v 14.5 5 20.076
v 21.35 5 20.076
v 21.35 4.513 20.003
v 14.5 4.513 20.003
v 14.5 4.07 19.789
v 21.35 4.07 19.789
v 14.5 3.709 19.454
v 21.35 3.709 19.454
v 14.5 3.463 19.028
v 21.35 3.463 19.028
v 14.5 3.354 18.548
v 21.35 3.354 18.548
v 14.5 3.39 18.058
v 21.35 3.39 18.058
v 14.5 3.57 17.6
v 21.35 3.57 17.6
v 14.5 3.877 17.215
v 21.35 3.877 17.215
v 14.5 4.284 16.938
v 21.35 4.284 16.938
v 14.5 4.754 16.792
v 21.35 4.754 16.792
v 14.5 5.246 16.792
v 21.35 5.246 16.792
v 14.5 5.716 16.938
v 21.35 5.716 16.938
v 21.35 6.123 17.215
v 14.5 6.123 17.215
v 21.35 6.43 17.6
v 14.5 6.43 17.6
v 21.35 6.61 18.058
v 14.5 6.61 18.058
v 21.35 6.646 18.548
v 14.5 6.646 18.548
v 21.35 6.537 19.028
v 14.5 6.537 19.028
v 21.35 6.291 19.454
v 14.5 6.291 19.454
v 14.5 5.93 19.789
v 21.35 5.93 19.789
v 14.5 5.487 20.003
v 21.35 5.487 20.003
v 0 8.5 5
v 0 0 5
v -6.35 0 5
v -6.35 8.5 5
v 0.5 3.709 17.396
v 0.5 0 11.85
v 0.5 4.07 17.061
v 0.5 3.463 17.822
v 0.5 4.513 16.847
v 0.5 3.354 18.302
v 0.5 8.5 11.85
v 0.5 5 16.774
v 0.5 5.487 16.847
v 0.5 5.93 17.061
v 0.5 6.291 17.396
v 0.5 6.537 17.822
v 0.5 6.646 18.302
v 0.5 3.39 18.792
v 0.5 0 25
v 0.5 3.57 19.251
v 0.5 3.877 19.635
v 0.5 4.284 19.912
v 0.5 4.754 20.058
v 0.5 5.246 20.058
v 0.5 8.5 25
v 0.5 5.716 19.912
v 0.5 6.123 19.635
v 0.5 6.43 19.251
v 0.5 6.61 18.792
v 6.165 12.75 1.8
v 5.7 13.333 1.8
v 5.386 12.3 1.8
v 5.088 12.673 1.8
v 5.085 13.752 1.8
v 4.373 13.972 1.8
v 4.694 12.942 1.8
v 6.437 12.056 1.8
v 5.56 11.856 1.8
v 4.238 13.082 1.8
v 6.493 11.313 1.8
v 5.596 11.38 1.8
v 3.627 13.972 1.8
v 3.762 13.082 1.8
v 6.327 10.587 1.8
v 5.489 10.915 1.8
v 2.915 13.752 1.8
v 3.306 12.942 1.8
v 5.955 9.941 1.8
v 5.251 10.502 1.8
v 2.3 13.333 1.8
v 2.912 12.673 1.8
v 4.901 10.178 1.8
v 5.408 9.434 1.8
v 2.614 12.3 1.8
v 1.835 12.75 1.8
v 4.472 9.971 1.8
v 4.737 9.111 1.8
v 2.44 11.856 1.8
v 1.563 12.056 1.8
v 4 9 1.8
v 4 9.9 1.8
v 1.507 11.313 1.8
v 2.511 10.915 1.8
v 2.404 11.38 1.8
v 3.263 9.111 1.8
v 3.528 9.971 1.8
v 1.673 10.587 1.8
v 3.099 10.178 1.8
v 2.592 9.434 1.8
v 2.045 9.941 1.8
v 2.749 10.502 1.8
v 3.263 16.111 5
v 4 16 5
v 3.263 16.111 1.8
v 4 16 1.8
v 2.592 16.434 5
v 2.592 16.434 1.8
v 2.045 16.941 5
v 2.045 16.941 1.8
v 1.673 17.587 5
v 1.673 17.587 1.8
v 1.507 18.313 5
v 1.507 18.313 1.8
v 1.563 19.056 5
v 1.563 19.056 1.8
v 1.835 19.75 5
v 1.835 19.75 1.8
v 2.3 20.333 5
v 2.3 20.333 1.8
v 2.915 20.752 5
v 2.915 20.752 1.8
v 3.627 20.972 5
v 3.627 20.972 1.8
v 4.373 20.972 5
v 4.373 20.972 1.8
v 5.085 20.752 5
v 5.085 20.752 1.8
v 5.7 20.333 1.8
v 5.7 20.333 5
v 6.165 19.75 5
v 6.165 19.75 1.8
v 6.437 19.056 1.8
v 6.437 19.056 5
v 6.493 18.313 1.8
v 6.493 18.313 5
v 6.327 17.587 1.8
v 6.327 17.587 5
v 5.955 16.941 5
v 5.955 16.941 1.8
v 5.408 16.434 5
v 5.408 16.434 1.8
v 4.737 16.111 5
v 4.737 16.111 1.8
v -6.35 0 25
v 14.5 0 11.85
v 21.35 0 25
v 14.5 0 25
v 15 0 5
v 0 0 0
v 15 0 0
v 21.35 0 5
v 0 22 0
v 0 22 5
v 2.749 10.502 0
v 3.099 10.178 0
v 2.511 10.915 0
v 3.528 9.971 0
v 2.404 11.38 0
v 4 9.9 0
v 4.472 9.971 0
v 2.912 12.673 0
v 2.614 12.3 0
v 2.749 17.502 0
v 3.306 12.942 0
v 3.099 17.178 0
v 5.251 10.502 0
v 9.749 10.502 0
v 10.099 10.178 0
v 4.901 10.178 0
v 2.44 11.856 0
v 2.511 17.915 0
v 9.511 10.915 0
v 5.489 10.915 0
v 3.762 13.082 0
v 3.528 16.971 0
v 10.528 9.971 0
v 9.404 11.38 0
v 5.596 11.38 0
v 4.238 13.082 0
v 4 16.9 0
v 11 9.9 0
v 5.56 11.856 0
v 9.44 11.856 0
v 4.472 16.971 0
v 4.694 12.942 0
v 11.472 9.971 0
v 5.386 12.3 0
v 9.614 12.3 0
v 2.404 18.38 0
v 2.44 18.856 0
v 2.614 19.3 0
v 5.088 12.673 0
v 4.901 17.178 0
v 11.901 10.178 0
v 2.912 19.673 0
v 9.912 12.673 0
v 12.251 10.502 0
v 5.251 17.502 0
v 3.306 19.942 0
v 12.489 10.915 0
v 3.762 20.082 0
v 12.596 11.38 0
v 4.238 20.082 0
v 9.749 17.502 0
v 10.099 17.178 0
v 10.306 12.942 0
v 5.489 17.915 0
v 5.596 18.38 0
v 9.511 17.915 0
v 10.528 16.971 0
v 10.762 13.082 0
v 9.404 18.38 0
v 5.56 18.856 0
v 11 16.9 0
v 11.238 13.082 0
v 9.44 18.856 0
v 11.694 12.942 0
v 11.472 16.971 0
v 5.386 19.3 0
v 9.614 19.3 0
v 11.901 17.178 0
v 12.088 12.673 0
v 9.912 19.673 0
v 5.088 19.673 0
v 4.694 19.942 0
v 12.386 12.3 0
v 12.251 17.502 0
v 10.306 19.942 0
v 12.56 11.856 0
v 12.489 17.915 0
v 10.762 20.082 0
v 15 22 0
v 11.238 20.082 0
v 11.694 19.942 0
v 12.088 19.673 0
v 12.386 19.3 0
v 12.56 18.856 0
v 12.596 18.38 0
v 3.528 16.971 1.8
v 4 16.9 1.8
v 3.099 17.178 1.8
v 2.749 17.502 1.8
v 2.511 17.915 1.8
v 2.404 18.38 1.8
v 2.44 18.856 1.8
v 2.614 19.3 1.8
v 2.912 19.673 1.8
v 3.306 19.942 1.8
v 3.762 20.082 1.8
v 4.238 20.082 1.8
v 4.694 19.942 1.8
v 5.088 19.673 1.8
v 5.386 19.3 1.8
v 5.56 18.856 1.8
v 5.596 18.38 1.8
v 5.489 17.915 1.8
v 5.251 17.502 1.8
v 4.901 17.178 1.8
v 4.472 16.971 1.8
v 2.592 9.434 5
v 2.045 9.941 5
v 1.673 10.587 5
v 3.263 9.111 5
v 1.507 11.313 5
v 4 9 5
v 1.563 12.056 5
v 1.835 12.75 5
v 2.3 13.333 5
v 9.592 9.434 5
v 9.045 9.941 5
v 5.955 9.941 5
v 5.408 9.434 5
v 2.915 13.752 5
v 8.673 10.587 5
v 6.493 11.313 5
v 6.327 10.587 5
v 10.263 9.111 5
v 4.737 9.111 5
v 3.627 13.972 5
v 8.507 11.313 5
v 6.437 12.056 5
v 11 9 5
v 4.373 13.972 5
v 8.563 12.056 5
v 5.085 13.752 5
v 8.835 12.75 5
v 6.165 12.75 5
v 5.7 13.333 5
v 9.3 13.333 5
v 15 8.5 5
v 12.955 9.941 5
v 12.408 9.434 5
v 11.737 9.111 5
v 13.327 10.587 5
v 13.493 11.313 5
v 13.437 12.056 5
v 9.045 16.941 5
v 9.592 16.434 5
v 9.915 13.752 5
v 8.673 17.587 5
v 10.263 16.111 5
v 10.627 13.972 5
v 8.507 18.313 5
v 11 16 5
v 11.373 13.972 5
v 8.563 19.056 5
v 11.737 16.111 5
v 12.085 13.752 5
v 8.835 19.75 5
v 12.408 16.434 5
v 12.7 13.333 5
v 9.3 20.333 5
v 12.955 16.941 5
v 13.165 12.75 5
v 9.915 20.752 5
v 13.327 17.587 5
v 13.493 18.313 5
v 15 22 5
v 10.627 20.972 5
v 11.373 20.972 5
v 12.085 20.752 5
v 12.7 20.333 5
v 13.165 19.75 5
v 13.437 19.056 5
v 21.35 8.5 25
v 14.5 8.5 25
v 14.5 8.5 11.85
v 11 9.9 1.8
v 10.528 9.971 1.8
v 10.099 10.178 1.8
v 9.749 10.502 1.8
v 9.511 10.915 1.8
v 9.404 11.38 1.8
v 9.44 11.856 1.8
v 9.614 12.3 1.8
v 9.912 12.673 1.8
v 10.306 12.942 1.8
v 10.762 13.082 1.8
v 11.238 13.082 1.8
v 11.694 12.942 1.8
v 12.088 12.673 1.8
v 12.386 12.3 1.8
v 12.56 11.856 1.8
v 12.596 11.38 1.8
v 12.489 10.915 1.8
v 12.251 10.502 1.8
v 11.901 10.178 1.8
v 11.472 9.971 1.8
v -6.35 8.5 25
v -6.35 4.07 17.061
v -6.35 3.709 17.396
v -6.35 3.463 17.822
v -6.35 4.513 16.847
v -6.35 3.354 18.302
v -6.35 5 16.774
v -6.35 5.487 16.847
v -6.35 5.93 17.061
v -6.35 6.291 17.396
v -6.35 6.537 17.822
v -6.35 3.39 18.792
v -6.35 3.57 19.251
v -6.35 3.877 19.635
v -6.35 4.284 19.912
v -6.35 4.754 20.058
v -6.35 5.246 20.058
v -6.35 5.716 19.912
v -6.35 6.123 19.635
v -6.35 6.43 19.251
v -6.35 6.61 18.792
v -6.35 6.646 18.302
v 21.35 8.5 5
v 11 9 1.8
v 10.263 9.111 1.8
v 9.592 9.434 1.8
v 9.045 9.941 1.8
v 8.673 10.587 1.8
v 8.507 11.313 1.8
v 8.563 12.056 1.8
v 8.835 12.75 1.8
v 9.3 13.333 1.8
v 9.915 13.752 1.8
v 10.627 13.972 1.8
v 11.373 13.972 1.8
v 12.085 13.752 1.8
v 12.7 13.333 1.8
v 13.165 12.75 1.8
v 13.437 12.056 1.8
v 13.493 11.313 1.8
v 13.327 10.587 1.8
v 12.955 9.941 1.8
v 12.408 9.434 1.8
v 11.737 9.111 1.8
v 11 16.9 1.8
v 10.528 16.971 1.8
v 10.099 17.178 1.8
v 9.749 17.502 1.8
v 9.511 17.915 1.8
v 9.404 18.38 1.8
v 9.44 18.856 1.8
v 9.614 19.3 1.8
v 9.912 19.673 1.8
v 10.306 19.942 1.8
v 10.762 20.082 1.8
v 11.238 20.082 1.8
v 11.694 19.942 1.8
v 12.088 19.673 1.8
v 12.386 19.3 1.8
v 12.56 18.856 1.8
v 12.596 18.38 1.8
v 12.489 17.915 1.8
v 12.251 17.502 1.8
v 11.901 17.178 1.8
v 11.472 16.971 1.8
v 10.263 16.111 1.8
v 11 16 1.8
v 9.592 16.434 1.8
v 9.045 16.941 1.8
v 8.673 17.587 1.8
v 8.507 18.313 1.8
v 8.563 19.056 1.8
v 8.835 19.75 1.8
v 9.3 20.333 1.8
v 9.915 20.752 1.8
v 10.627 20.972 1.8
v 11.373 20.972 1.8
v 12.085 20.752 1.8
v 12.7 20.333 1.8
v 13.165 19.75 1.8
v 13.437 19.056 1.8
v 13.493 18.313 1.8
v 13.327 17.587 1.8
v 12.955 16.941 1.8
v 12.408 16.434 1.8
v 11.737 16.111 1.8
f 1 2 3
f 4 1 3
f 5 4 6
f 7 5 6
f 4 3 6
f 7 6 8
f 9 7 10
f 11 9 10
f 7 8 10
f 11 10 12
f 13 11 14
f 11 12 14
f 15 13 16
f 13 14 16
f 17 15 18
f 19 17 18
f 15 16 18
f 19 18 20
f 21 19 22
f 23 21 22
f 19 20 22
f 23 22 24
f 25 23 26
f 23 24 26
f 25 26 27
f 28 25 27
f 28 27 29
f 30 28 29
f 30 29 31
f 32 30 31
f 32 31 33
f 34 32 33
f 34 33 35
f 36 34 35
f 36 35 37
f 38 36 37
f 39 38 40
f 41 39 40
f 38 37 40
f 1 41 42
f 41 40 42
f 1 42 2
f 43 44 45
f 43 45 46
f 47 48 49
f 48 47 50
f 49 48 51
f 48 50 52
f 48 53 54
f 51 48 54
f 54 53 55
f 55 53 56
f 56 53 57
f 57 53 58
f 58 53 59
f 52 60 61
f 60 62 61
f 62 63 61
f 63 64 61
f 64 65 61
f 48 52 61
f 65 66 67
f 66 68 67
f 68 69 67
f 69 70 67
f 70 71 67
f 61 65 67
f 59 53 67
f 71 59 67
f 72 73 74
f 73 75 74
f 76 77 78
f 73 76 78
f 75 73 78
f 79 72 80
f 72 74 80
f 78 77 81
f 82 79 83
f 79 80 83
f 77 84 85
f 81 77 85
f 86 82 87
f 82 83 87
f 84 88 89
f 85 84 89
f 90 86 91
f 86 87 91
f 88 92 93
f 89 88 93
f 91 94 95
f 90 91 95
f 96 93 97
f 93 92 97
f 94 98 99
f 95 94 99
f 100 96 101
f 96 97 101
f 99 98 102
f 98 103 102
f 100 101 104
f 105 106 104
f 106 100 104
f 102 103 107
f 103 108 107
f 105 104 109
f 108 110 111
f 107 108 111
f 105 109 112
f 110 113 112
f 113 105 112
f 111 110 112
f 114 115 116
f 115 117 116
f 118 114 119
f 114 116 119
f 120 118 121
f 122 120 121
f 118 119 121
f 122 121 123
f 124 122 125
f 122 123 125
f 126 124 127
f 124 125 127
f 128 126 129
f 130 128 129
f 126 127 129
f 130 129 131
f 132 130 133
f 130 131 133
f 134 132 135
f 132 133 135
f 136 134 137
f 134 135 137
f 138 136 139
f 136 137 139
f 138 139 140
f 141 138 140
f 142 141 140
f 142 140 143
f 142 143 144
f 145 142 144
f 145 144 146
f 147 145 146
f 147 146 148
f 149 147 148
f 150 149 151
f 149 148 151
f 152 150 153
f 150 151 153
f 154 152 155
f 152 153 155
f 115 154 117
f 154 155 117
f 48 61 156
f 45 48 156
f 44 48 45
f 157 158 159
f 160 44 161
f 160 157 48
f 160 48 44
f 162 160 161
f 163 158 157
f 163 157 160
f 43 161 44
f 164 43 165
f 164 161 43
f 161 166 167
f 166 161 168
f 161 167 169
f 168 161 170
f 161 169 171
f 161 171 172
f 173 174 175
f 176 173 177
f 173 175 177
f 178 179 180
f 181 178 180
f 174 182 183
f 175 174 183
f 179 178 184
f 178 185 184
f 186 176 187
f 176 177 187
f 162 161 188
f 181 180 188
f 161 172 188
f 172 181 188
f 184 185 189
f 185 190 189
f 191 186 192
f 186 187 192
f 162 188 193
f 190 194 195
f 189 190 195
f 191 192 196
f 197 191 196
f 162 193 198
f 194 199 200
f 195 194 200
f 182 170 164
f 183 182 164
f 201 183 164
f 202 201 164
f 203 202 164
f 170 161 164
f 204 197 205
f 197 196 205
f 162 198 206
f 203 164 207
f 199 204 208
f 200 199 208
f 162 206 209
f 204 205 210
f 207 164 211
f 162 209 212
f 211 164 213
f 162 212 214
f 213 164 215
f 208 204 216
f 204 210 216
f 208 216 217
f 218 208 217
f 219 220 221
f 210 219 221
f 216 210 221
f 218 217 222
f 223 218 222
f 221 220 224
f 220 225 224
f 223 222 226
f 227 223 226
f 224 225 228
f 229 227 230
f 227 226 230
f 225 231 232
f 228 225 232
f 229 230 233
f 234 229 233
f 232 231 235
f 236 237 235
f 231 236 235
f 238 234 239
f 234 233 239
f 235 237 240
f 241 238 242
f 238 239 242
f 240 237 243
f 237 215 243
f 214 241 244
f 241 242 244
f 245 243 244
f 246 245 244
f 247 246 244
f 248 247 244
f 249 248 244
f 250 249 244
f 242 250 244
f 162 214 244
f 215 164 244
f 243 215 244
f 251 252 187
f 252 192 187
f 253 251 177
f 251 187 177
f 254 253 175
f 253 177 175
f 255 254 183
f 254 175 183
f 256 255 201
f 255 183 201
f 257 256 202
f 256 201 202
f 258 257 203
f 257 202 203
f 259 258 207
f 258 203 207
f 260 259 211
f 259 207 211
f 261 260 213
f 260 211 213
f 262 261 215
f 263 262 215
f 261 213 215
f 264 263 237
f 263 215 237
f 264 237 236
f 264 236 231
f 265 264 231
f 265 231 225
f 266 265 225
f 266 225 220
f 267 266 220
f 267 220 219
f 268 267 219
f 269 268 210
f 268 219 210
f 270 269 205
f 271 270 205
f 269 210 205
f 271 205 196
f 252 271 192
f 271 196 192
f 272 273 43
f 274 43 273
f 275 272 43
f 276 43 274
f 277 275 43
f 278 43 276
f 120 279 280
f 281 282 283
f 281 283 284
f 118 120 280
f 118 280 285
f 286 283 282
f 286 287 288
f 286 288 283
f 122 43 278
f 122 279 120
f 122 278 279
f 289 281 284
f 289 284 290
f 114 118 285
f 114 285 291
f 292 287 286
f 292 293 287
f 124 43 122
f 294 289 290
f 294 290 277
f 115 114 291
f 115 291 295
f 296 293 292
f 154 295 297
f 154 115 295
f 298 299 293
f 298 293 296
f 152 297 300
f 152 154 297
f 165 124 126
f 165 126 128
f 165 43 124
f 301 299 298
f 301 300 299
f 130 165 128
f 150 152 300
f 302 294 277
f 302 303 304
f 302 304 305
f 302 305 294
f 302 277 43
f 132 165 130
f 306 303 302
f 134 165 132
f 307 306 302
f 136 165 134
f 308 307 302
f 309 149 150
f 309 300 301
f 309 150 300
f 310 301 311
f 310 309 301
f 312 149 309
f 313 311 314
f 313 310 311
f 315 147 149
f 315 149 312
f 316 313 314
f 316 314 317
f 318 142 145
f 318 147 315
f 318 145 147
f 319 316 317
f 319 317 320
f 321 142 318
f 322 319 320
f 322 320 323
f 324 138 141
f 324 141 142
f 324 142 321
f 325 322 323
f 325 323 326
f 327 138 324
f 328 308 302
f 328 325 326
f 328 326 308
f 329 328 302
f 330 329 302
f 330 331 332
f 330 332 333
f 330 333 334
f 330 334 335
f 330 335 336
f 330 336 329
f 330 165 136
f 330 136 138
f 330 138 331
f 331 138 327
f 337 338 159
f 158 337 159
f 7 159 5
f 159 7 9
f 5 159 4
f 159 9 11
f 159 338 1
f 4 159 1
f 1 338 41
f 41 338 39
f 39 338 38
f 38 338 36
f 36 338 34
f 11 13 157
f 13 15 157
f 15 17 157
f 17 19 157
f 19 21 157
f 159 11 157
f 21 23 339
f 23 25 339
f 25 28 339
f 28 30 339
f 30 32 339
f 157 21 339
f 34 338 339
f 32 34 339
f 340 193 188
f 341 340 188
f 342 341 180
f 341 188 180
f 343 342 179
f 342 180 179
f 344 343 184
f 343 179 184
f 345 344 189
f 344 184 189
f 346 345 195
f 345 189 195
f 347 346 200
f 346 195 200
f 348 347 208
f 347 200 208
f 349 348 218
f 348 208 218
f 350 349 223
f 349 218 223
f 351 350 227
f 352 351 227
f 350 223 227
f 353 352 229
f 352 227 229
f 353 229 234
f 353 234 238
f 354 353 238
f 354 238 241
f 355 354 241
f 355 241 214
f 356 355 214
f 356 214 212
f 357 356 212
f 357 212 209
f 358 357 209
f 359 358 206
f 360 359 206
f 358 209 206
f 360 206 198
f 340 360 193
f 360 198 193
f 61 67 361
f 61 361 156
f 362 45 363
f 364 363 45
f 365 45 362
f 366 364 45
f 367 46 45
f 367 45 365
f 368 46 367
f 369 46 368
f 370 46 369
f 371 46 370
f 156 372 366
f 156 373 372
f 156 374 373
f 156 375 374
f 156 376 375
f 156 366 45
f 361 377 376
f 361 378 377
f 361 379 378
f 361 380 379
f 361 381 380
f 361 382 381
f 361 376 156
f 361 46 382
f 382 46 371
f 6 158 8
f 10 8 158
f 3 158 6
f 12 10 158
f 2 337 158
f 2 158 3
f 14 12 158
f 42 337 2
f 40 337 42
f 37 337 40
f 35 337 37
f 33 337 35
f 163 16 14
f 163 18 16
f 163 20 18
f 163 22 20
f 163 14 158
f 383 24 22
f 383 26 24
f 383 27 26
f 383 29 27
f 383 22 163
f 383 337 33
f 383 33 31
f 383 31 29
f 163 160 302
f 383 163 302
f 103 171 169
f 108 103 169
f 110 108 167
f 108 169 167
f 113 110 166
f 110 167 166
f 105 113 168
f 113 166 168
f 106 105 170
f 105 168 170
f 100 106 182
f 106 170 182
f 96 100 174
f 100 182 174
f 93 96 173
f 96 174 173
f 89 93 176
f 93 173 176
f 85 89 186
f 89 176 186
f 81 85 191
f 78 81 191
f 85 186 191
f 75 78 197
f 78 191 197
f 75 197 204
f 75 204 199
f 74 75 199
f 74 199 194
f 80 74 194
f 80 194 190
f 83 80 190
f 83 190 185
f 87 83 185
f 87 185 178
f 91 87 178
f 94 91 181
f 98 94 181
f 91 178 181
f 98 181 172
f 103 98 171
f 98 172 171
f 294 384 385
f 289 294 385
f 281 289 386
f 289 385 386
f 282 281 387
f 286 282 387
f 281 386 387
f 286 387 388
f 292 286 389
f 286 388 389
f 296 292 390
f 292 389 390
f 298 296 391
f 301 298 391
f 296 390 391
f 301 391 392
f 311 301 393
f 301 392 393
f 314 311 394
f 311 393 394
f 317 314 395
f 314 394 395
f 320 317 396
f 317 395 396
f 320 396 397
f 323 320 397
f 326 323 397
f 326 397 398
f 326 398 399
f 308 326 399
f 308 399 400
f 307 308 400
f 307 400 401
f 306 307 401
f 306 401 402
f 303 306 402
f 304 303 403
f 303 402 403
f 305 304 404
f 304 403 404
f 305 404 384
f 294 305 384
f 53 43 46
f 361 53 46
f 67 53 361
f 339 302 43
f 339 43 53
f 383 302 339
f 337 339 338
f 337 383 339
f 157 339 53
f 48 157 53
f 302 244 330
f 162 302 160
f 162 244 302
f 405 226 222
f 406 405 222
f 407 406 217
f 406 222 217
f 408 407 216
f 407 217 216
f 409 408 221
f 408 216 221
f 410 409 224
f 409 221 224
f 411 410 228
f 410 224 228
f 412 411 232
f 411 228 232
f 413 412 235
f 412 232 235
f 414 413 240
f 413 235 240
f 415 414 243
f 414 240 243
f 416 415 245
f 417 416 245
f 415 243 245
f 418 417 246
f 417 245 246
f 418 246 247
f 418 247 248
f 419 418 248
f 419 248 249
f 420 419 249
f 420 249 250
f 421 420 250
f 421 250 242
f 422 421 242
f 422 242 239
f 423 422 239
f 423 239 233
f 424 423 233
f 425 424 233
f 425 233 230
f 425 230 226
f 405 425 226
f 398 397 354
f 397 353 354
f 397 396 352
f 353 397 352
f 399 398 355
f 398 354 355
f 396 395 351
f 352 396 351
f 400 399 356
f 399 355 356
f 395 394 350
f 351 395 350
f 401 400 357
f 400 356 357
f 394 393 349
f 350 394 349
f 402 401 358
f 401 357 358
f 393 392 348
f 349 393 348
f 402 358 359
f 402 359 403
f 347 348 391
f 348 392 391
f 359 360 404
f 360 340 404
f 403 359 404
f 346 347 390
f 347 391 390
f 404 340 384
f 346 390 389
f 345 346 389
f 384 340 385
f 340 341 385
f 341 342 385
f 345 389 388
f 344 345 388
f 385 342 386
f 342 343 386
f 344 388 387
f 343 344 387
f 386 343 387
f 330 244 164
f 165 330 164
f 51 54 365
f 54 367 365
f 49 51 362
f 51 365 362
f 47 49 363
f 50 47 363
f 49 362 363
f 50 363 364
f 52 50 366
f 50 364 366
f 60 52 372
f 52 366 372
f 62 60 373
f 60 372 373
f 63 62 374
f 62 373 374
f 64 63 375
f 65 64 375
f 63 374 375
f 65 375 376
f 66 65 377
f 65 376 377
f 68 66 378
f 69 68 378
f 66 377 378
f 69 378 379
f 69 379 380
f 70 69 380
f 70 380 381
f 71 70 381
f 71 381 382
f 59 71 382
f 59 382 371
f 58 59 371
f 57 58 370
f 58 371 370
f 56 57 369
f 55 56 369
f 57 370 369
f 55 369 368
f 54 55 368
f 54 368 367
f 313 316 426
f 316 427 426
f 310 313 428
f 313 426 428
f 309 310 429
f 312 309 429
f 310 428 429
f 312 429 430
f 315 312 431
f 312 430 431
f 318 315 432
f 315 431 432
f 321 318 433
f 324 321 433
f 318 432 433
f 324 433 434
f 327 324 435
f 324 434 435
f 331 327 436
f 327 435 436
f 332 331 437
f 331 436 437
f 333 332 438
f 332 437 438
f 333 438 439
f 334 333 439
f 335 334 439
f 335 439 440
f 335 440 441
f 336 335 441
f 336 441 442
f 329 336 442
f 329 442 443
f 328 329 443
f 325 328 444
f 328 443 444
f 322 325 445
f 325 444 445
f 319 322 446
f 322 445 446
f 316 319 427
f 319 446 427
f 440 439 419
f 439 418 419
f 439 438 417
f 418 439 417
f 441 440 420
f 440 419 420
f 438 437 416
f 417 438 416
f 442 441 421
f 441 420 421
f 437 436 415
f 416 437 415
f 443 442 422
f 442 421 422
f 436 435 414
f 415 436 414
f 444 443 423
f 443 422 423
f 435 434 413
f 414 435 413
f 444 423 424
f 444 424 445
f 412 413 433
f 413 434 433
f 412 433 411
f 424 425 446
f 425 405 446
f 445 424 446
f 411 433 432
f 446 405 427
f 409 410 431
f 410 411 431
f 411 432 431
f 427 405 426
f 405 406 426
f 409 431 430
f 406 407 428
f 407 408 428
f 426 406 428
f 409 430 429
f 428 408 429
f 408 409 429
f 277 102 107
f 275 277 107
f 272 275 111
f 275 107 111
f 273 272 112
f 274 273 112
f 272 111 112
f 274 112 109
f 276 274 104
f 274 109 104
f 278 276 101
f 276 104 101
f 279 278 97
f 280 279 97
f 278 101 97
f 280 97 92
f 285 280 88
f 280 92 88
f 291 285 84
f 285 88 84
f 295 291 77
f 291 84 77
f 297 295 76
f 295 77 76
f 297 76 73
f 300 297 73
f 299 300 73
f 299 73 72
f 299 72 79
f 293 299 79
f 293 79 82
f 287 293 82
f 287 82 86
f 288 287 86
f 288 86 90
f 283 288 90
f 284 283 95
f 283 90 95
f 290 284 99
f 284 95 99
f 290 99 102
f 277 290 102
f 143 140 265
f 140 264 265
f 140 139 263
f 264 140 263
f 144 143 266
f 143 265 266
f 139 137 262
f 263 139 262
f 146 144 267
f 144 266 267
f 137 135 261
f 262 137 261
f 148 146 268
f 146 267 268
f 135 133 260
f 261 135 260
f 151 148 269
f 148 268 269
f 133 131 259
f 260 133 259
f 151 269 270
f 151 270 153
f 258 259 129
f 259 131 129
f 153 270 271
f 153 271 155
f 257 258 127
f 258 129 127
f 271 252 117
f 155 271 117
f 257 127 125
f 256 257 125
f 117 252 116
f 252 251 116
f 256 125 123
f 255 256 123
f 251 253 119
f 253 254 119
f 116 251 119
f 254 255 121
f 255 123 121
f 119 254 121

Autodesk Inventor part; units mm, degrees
ref_plane "YZ Plane" through (0, 0, 0) normal (1, 0, 0) x (0, 1, 0)
ref_plane "XZ Plane" through (0, 0, 0) normal (0, 1, 0) x (-1, 0, 0)
ref_plane "XY Plane" through (0, 0, 0) normal (0, 0, 1) x (1, 0, 0)
sketch "Sketch1" plane through (0, 0, 0) normal (0, 0, 1) x (1, 0, 0)
  line L0 (0, 0) -> (15, 0)
  line L1 (15, 0) -> (15, 22)
  line L2 (15, 22) -> (0, 22)
  line L3 (0, 22) -> (0, 0)
  dimension "d0" = 15
  dimension "d1" = 22
extrude "Extrusion1" add sketch "Sketch1" along normal blind 5
sketch "Sketch2" plane through (0, 0, 5) normal (0, 0, 1) x (1, 0, 0)
  circle A0 centre (4, 18.5) radius 2.5
  circle A1 centre (11, 18.5) radius 2.5
  circle A2 centre (4, 11.5) radius 2.5
  circle A3 centre (11, 11.5) radius 2.5
  line L0 (15, 22) -> (0, 22) projected
  line L1 (0, 22) -> (0, 0) projected
  line L2 (15, 0) -> (15, 22) projected
  dimension "d4" = 5
  dimension "d5" = 5
  dimension "d6" = 7
  dimension "d7" = 5
  dimension "d8" = 5
  dimension "d9" = 7
  dimension "d10" = 7
  dimension "d11" = 3.5
  dimension "d12" = 3.5
  dimension "d26" = 4
  dimension "d27" = 4
  dimension "d28" = 4
  dimension "d29" = 4
hole "Hole1" at (4, 18.5, 5) at (4, 11.5, 5) at (11, 18.5, 5) at (11, 11.5, 5) direction (0, 0, -1) diameter 3.2 end through all counterbore diameter 5 counterbore depth 3.2
sketch "Sketch3" plane through (0, 0, 5) normal (0, 0, 1) x (1, 0, 0)
  line L0 (15, 0) -> (0, 0)
  line L1 (0, 0) -> (0, 8.5)
  line L2 (0, 8.5) -> (15, 8.5)
  line L3 (15, 8.5) -> (15, 0)
  line L4 (15, 0) -> (15, 22) projected
  line L5 (0, 22) -> (0, 0) projected
  line L6 (0, 0) -> (15, 0) projected
  dimension "d20" = 8.5
  dimension "d21" = 0
  dimension "d22" = 0
  dimension "d23" = 0
extrude "Extrusion2" add sketch "Sketch3" along normal blind 20
sketch "Sketch4" plane through (0, 8.5, 5) normal (0, 1, 0) x (1, 0, 0)
  line L0 (0.5, -20) -> (14.5, -20)
  line L1 (14.5, -20) -> (14.5, -6.85)
  line L2 (14.5, -6.85) -> (0.5, -6.85)
  line L3 (0.5, -6.85) -> (0.5, -20)
  line L4 (15, -20) -> (0, -20) projected
  line L5 (0, 0) -> (0, -20) projected
  point P0 (0, 5)
  dimension "d30" = 0
  dimension "d31" = 13.15
  dimension "d32" = 14
  dimension "d33" = 0.5
extrude "Extrusion3" cut sketch "Sketch4" against normal blind 8.5
sketch "Sketch6" plane through (0.5, 8.5, 25) normal (1, 0, 0) x (0, 0, -1)
  circle A0 centre (6.575, -3.5) radius 1.5
  line L0 (0, 0) -> (13.15, 0) projected
  line L1 (0, -8.5) -> (0, 0) projected
  point P0 (25, -8.5)
  point P1 (0, -7)
  dimension "d42" = 3
  dimension "d43" = 3.5
  dimension "d44" = 6.575
  dimension "d83" = 13.15
  dimension "d84" = 7
sketch "Sketch7" plane through (14.5, 8.5, 11.85) normal (-1, 0, 0) x (0, 0, 1)
  circle A0 centre (6.575, -3.5) radius 1.5
  line L0 (13.15, 0) -> (13.15, -8.5) projected
  line L1 (0, 0) -> (13.15, 0) projected
  line L2 (0, 0) -> (0, -8.5) projected
  point P0 (-11.85, -8.5)
  point P1 (13.15, -7)
  point P2 (0, -7)
  dimension "d45" = 3
  dimension "d46" = 6.575
  dimension "d47" = 3.5
  dimension "d81" = 13.15
  dimension "d82" = 7
sketch "Sketch8" plane through (15, 0, 0) normal (1, 0, 0) x (0, 0, -1)
  line L0 (0, 0) -> (-25, 0) projected
  line L1 (-5, 8.5) -> (-25, 8.5) projected
  line L2 (-25, 0) -> (-5, 0)
  line L3 (-5, 0) -> (-5, 8.5)
  line L4 (-5, 8.5) -> (-25, 8.5)
  line L5 (-25, 8.5) -> (-25, 0)
extrude "Extrusion5" add sketch "Sketch8" along normal blind 6.35
hole "Hole4" at (14.5, 5, 18.425) direction (1, 0, 0) diameter 3.302 end through all thread size "8-32 UNC" class "2B" standard "ANSI Unified Screw Threads"
sketch "Sketch9" plane through (0, 0, 0) normal (-1, 0, 0) x (0, 0, 1)
  line L0 (5, 8.5) -> (25, 8.5) projected
  line L1 (25, 0) -> (5, 0) projected
  line L2 (5, 8.5) -> (25, 8.5)
  line L3 (25, 8.5) -> (25, 0)
  line L4 (25, 0) -> (5, 0)
  line L5 (5, 0) -> (5, 8.5)
  point P0 (0, 0)
extrude "Extrusion6" add sketch "Sketch9" along normal blind 6.35
hole "Hole5" at (0.5, 5, 18.425) direction (-1, 0, 0) diameter 3.302 end through all thread size "8-32 UNC" class "2B" standard "ANSI Unified Screw Threads"
equation "\"d5\" = d4"
equation "\"d7\" = d4"
equation "\"d8\" = d4"
equation "\"d12\" = d11"
equation "\"d29\" = d26"
equation "\"d18\" = Thickness"
equation "\"d43\" = 0.5 * d84"
equation "\"d44\" = 0.5 * d83"
equation "\"d46\" = 0.5 * d81"
equation "\"d47\" = 0.5 * d82"
equation "\"BendRadius\" = Thickness"
equation "\"BendReliefWidth\" = Thickness"
equation "\"BendReliefDepth\" = 0.5 * Thickness"
equation "\"CornerReliefSize\" = 4 * Thickness"
equation "\"MinimumRemnant\" = 2 * Thickness"
equation "\"TransitionRadius\" = BendRadius"
equation "\"JacobiRadiusSize\" = BendRadius"
equation "\"GapSize\" = Thickness"
equation "\"Thickness\" = 0.5"
properties part number "Sample holder long L_V4"
